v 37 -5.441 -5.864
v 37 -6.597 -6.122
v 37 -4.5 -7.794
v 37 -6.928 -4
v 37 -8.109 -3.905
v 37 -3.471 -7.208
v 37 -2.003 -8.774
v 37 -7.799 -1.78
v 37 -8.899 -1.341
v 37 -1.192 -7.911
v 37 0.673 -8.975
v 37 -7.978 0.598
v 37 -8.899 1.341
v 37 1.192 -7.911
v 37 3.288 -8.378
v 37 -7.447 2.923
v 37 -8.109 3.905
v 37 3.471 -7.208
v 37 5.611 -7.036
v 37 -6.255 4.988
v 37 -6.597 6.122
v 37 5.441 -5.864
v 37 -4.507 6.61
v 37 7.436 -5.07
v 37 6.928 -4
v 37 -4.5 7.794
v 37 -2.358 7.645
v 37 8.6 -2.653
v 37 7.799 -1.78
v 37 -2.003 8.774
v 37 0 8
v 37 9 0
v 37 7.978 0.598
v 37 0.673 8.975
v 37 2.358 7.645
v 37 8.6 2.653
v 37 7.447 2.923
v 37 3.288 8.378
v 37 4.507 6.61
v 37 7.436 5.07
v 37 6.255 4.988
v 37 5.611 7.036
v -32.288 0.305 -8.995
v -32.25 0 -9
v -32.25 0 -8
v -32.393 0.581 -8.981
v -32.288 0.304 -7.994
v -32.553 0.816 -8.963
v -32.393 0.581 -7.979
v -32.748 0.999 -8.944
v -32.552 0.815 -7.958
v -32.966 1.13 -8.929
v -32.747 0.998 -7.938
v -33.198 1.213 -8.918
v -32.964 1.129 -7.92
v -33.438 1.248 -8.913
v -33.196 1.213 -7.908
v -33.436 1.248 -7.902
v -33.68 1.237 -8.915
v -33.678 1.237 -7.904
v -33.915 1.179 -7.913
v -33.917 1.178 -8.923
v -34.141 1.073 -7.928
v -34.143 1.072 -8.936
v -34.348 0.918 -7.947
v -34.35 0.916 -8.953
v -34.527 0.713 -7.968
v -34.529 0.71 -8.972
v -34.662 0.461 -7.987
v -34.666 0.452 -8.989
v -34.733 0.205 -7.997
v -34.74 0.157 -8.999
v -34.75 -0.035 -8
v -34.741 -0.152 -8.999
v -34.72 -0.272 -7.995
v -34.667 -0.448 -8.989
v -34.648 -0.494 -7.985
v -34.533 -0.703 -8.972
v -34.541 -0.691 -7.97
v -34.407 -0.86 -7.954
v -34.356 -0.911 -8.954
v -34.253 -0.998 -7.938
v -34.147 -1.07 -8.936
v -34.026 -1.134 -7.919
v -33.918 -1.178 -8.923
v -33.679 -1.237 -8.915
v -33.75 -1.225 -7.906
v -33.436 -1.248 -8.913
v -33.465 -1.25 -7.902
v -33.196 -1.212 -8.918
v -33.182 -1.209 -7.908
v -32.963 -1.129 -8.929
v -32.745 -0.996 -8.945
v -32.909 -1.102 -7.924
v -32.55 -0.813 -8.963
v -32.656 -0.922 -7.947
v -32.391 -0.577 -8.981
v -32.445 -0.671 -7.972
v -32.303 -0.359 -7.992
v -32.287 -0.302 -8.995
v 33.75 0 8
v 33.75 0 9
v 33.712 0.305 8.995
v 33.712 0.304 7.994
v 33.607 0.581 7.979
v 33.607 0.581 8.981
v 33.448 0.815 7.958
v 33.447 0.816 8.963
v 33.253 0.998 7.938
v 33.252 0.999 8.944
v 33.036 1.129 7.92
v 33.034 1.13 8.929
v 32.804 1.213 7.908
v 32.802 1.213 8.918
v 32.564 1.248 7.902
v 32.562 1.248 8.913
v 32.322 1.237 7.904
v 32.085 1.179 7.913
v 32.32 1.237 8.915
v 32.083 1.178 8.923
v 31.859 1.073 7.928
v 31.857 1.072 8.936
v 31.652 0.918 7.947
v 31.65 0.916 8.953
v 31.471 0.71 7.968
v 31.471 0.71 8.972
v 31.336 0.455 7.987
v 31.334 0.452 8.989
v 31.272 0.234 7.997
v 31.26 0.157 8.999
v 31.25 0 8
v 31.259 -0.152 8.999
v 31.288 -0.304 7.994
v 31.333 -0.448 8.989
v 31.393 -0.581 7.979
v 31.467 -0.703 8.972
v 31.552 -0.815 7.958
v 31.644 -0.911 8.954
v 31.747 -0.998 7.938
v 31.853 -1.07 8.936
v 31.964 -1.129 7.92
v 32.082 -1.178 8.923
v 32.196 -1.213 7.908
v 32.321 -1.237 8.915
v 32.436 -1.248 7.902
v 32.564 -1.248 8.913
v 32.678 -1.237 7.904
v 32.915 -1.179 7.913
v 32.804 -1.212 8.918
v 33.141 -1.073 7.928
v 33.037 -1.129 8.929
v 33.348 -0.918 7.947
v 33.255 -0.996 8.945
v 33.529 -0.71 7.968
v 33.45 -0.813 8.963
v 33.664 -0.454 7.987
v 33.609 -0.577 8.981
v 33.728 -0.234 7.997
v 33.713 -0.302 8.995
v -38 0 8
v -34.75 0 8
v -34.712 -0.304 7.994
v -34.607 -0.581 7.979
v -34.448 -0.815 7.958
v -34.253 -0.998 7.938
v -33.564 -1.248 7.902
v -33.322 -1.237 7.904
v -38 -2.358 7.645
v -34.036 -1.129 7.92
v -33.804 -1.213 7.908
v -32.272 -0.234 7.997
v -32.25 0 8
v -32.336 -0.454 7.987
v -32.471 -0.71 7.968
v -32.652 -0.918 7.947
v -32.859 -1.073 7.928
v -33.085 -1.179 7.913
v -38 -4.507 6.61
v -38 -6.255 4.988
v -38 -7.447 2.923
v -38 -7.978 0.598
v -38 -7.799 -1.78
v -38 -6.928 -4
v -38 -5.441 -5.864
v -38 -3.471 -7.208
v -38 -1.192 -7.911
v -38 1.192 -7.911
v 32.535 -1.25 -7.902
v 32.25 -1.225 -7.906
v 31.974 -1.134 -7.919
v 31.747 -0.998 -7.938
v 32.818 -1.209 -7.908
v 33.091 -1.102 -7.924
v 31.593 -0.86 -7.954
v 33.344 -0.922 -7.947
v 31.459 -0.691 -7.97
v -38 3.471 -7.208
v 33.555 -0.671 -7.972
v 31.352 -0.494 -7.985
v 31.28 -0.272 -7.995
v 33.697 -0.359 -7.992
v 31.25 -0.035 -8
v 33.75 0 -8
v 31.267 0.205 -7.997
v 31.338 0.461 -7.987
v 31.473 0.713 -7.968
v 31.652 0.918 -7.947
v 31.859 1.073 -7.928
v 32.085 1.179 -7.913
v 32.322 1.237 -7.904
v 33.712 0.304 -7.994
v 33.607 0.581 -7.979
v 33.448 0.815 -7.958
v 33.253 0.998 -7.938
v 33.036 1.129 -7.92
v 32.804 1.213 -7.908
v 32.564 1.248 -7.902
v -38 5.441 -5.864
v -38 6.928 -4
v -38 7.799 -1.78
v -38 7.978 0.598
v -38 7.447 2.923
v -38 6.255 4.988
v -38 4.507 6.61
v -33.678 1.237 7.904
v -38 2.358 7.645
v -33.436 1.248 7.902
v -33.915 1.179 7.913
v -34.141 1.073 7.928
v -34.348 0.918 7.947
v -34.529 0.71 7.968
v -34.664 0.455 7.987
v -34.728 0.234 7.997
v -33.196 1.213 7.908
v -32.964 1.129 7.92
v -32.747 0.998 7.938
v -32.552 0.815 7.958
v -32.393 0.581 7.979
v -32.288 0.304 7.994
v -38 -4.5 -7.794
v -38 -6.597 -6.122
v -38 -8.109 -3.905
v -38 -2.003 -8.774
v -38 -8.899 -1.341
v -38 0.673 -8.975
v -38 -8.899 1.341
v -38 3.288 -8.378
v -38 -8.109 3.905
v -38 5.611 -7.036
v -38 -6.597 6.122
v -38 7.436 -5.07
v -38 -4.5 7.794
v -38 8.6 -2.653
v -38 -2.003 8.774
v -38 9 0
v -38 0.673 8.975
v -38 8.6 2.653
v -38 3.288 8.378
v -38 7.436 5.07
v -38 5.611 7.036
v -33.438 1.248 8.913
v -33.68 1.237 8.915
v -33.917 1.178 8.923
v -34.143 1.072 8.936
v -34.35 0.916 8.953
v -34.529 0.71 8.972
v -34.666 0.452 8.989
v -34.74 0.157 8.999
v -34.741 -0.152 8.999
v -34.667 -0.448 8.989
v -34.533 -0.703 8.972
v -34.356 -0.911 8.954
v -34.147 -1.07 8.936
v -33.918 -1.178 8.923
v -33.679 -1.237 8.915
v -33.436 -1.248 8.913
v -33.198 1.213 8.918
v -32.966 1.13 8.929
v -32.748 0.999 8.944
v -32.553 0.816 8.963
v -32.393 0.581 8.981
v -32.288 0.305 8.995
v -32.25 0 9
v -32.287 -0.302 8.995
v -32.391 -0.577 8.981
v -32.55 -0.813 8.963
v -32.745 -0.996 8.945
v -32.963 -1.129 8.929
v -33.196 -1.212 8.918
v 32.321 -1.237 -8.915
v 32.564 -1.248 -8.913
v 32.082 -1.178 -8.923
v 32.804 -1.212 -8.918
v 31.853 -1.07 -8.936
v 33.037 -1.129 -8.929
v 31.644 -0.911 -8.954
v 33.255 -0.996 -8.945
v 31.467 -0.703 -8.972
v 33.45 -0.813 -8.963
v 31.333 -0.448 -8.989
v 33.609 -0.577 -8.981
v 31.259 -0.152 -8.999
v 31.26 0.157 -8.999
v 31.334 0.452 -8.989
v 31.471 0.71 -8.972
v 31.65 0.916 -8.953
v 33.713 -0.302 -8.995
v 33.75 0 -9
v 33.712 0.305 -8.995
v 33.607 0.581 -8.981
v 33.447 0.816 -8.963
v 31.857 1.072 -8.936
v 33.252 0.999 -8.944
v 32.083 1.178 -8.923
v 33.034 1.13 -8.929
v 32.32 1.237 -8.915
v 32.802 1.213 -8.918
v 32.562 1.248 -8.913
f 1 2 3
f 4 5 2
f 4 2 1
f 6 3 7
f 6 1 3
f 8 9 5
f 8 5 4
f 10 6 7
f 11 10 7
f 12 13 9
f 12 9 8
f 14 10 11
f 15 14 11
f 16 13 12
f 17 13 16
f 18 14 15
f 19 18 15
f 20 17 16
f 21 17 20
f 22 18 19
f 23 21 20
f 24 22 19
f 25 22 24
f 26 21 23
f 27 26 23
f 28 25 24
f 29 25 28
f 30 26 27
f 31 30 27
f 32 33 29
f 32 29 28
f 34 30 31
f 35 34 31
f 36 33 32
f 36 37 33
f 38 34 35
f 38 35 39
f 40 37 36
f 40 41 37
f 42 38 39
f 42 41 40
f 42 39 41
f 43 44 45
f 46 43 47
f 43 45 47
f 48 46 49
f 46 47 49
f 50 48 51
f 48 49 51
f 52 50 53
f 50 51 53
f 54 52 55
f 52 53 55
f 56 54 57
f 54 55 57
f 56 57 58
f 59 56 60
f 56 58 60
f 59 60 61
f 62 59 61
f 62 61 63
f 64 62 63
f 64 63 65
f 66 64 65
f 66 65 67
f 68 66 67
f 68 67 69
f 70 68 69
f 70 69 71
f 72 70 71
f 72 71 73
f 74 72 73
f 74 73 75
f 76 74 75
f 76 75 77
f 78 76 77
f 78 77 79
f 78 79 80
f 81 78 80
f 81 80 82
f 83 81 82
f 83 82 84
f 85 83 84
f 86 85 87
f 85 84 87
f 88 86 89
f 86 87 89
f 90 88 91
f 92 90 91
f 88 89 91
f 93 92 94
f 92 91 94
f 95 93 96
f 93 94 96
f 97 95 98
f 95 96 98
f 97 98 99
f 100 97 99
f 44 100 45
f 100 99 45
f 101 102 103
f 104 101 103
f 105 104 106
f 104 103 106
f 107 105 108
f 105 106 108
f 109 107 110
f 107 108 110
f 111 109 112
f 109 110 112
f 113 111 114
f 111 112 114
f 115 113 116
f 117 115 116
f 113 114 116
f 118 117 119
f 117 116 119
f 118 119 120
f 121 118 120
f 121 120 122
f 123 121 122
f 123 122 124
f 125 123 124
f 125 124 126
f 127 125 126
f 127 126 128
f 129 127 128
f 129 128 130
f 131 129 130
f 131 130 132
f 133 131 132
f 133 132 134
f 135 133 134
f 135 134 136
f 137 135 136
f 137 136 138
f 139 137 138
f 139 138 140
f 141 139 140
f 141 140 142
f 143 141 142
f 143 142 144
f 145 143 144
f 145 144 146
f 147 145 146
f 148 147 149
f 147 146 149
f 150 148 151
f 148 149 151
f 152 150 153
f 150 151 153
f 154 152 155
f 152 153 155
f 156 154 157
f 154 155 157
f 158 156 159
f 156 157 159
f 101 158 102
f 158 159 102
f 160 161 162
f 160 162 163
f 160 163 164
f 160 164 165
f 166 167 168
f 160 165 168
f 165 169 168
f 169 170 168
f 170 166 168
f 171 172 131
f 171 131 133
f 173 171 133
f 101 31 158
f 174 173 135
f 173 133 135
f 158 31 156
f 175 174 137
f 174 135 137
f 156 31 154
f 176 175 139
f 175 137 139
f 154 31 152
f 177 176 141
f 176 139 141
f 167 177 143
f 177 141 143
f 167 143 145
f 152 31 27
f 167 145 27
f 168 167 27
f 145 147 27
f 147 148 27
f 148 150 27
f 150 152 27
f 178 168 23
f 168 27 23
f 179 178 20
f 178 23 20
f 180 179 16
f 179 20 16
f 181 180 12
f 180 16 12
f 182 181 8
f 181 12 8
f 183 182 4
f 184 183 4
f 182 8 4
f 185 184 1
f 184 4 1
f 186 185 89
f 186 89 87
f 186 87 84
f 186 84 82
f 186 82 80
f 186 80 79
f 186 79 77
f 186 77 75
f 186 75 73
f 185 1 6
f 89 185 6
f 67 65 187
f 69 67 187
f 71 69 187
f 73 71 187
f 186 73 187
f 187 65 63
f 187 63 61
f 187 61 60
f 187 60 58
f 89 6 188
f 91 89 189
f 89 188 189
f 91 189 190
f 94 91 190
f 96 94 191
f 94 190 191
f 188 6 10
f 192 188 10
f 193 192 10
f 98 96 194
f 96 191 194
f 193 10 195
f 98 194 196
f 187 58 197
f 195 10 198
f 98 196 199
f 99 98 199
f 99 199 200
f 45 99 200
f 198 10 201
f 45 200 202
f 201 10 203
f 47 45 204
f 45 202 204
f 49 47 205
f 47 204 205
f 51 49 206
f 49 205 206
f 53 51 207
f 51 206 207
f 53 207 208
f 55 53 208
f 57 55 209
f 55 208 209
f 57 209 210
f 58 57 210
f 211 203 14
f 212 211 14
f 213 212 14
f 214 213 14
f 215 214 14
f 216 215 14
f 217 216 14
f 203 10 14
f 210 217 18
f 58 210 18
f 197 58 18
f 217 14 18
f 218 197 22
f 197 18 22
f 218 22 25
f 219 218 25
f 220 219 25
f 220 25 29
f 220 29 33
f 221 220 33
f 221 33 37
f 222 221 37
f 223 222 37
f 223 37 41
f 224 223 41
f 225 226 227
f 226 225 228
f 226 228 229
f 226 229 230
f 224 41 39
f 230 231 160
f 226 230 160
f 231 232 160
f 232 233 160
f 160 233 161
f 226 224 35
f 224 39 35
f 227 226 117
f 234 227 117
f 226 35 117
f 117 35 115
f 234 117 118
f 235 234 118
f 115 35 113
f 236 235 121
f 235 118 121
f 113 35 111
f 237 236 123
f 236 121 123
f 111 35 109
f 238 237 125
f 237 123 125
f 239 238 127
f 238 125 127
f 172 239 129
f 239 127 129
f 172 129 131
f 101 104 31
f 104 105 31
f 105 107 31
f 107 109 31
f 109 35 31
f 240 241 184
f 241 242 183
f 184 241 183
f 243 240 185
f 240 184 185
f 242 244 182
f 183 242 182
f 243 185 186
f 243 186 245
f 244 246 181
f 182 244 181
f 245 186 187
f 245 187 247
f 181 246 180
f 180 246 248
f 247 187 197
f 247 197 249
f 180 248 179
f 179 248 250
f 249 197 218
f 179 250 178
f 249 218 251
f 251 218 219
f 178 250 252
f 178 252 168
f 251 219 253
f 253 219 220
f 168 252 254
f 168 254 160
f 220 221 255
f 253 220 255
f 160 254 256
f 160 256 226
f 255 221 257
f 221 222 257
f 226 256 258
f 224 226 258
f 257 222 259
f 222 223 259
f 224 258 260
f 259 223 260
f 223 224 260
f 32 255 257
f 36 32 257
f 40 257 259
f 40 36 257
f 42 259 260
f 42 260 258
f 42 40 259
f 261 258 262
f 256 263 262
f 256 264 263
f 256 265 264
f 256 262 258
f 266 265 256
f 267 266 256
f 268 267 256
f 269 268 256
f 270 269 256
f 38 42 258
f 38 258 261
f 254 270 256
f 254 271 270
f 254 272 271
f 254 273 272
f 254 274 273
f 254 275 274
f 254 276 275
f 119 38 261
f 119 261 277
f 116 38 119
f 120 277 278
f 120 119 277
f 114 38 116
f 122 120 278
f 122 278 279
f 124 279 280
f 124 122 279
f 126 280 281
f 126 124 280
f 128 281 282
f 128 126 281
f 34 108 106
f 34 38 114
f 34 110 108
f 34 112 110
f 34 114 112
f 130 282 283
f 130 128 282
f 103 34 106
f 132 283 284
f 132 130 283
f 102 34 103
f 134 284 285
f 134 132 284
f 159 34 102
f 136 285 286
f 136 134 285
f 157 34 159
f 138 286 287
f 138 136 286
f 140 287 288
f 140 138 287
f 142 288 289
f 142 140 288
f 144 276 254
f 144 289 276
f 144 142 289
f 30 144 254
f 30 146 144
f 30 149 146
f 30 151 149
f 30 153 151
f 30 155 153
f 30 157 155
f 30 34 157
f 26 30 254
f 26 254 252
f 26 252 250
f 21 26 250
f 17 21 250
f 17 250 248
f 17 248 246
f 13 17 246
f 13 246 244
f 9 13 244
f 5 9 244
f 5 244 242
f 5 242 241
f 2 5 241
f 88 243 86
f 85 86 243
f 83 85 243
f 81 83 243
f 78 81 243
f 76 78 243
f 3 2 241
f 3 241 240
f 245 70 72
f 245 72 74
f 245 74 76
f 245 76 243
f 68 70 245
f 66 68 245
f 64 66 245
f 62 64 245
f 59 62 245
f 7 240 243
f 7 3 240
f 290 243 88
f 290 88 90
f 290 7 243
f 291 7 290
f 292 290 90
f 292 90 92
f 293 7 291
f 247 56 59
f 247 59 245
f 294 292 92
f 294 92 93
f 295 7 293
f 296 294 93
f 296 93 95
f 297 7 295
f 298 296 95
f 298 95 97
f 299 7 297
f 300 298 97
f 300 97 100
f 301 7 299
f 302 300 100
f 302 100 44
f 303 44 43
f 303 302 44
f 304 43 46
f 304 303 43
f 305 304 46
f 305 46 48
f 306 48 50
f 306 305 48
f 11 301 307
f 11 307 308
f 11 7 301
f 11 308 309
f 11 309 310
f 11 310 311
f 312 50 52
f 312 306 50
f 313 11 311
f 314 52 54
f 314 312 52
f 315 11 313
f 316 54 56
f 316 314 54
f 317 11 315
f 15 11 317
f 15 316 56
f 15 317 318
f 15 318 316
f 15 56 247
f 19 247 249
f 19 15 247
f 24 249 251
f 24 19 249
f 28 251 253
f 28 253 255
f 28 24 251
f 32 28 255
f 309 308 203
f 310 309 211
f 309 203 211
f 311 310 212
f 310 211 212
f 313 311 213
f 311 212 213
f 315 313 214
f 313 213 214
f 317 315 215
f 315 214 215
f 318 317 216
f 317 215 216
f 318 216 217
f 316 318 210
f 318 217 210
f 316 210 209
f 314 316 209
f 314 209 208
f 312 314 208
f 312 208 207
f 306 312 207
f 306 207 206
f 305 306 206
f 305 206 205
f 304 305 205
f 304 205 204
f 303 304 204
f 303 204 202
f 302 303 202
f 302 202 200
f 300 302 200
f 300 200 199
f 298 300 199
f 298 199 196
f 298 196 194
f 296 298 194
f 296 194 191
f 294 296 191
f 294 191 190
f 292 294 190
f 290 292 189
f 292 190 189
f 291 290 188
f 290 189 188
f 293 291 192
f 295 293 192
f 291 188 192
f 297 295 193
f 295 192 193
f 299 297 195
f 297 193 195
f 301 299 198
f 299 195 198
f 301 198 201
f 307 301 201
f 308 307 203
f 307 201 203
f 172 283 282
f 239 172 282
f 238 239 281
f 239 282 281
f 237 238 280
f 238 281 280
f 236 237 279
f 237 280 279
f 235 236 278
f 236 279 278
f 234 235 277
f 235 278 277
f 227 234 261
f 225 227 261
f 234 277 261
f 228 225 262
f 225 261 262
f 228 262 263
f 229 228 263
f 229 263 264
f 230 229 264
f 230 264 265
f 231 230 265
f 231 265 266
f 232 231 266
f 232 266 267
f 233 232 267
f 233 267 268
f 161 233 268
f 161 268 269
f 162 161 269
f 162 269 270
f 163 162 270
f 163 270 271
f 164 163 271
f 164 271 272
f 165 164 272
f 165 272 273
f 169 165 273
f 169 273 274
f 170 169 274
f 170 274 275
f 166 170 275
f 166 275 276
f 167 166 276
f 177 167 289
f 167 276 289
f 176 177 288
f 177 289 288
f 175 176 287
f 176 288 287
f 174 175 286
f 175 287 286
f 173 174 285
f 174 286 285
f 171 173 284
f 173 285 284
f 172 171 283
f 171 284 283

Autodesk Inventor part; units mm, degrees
ref_plane "YZ Plane" through (0, 0, 0) normal (1, 0, 0) x (0, 1, 0)
ref_plane "XZ Plane" through (0, 0, 0) normal (0, 1, 0) x (-1, 0, 0)
sketch "ShaftProfile" plane through (0, 0, 0) normal (0, 0, 1) x (1, 0, 0)
  line L0 (-53, 0) -> (52, 0) construction
  line L1 (-38, 9) -> (37, 9)
  line L2 (37, 9) -> (37, 0)
  line L3 (-38, 0) -> (-38, 9)
  line L4 (-38, 0) -> (37, 0)
  point P0 (0, 0)
  dimension "d1" = 75
  dimension "d2" = 9
  dimension "d4" = 38
revolve "ShaftFeature" add sketch "ShaftProfile" angle 360 about axis through (-38, 0, 0) along (1, 0, 0)
sketch "Sketch2" plane through (-38, 0, 0) normal (-1, 0, 0) x (0, 0, 1)
  circle A0 centre (0, 0) radius 9 projected
hole "ShaftHoleFeature" at (-38, 0, 0) direction (1, 0, 0) diameter 16 end through all
ref_plane "MidSidePlane" through (0, 0, 10) normal (0, 0, 1) x (1, 0, 0)
sketch "CapHoles" plane through (0, 0, 10) normal (0, 0, 1) x (1, 0, 0)
  line L0 (37, -9) -> (37, 9) construction
  line L1 (-38, -9) -> (-38, 9) construction
  line L2 (-57, 0) -> (76, 0) construction
  circle A0 centre (-33.5, 0) radius 1.25
  circle A1 centre (32.5, 0) radius 1.25
  dimension "d24" = 2.5
  dimension "d25" = 4.5
  dimension "d26" = 4.5
extrude "CapHolesFeature" cut sketch "CapHoles" against normal through all
equation "\"d26\" = d25"
properties part number "BackPair1PistonShaft"
